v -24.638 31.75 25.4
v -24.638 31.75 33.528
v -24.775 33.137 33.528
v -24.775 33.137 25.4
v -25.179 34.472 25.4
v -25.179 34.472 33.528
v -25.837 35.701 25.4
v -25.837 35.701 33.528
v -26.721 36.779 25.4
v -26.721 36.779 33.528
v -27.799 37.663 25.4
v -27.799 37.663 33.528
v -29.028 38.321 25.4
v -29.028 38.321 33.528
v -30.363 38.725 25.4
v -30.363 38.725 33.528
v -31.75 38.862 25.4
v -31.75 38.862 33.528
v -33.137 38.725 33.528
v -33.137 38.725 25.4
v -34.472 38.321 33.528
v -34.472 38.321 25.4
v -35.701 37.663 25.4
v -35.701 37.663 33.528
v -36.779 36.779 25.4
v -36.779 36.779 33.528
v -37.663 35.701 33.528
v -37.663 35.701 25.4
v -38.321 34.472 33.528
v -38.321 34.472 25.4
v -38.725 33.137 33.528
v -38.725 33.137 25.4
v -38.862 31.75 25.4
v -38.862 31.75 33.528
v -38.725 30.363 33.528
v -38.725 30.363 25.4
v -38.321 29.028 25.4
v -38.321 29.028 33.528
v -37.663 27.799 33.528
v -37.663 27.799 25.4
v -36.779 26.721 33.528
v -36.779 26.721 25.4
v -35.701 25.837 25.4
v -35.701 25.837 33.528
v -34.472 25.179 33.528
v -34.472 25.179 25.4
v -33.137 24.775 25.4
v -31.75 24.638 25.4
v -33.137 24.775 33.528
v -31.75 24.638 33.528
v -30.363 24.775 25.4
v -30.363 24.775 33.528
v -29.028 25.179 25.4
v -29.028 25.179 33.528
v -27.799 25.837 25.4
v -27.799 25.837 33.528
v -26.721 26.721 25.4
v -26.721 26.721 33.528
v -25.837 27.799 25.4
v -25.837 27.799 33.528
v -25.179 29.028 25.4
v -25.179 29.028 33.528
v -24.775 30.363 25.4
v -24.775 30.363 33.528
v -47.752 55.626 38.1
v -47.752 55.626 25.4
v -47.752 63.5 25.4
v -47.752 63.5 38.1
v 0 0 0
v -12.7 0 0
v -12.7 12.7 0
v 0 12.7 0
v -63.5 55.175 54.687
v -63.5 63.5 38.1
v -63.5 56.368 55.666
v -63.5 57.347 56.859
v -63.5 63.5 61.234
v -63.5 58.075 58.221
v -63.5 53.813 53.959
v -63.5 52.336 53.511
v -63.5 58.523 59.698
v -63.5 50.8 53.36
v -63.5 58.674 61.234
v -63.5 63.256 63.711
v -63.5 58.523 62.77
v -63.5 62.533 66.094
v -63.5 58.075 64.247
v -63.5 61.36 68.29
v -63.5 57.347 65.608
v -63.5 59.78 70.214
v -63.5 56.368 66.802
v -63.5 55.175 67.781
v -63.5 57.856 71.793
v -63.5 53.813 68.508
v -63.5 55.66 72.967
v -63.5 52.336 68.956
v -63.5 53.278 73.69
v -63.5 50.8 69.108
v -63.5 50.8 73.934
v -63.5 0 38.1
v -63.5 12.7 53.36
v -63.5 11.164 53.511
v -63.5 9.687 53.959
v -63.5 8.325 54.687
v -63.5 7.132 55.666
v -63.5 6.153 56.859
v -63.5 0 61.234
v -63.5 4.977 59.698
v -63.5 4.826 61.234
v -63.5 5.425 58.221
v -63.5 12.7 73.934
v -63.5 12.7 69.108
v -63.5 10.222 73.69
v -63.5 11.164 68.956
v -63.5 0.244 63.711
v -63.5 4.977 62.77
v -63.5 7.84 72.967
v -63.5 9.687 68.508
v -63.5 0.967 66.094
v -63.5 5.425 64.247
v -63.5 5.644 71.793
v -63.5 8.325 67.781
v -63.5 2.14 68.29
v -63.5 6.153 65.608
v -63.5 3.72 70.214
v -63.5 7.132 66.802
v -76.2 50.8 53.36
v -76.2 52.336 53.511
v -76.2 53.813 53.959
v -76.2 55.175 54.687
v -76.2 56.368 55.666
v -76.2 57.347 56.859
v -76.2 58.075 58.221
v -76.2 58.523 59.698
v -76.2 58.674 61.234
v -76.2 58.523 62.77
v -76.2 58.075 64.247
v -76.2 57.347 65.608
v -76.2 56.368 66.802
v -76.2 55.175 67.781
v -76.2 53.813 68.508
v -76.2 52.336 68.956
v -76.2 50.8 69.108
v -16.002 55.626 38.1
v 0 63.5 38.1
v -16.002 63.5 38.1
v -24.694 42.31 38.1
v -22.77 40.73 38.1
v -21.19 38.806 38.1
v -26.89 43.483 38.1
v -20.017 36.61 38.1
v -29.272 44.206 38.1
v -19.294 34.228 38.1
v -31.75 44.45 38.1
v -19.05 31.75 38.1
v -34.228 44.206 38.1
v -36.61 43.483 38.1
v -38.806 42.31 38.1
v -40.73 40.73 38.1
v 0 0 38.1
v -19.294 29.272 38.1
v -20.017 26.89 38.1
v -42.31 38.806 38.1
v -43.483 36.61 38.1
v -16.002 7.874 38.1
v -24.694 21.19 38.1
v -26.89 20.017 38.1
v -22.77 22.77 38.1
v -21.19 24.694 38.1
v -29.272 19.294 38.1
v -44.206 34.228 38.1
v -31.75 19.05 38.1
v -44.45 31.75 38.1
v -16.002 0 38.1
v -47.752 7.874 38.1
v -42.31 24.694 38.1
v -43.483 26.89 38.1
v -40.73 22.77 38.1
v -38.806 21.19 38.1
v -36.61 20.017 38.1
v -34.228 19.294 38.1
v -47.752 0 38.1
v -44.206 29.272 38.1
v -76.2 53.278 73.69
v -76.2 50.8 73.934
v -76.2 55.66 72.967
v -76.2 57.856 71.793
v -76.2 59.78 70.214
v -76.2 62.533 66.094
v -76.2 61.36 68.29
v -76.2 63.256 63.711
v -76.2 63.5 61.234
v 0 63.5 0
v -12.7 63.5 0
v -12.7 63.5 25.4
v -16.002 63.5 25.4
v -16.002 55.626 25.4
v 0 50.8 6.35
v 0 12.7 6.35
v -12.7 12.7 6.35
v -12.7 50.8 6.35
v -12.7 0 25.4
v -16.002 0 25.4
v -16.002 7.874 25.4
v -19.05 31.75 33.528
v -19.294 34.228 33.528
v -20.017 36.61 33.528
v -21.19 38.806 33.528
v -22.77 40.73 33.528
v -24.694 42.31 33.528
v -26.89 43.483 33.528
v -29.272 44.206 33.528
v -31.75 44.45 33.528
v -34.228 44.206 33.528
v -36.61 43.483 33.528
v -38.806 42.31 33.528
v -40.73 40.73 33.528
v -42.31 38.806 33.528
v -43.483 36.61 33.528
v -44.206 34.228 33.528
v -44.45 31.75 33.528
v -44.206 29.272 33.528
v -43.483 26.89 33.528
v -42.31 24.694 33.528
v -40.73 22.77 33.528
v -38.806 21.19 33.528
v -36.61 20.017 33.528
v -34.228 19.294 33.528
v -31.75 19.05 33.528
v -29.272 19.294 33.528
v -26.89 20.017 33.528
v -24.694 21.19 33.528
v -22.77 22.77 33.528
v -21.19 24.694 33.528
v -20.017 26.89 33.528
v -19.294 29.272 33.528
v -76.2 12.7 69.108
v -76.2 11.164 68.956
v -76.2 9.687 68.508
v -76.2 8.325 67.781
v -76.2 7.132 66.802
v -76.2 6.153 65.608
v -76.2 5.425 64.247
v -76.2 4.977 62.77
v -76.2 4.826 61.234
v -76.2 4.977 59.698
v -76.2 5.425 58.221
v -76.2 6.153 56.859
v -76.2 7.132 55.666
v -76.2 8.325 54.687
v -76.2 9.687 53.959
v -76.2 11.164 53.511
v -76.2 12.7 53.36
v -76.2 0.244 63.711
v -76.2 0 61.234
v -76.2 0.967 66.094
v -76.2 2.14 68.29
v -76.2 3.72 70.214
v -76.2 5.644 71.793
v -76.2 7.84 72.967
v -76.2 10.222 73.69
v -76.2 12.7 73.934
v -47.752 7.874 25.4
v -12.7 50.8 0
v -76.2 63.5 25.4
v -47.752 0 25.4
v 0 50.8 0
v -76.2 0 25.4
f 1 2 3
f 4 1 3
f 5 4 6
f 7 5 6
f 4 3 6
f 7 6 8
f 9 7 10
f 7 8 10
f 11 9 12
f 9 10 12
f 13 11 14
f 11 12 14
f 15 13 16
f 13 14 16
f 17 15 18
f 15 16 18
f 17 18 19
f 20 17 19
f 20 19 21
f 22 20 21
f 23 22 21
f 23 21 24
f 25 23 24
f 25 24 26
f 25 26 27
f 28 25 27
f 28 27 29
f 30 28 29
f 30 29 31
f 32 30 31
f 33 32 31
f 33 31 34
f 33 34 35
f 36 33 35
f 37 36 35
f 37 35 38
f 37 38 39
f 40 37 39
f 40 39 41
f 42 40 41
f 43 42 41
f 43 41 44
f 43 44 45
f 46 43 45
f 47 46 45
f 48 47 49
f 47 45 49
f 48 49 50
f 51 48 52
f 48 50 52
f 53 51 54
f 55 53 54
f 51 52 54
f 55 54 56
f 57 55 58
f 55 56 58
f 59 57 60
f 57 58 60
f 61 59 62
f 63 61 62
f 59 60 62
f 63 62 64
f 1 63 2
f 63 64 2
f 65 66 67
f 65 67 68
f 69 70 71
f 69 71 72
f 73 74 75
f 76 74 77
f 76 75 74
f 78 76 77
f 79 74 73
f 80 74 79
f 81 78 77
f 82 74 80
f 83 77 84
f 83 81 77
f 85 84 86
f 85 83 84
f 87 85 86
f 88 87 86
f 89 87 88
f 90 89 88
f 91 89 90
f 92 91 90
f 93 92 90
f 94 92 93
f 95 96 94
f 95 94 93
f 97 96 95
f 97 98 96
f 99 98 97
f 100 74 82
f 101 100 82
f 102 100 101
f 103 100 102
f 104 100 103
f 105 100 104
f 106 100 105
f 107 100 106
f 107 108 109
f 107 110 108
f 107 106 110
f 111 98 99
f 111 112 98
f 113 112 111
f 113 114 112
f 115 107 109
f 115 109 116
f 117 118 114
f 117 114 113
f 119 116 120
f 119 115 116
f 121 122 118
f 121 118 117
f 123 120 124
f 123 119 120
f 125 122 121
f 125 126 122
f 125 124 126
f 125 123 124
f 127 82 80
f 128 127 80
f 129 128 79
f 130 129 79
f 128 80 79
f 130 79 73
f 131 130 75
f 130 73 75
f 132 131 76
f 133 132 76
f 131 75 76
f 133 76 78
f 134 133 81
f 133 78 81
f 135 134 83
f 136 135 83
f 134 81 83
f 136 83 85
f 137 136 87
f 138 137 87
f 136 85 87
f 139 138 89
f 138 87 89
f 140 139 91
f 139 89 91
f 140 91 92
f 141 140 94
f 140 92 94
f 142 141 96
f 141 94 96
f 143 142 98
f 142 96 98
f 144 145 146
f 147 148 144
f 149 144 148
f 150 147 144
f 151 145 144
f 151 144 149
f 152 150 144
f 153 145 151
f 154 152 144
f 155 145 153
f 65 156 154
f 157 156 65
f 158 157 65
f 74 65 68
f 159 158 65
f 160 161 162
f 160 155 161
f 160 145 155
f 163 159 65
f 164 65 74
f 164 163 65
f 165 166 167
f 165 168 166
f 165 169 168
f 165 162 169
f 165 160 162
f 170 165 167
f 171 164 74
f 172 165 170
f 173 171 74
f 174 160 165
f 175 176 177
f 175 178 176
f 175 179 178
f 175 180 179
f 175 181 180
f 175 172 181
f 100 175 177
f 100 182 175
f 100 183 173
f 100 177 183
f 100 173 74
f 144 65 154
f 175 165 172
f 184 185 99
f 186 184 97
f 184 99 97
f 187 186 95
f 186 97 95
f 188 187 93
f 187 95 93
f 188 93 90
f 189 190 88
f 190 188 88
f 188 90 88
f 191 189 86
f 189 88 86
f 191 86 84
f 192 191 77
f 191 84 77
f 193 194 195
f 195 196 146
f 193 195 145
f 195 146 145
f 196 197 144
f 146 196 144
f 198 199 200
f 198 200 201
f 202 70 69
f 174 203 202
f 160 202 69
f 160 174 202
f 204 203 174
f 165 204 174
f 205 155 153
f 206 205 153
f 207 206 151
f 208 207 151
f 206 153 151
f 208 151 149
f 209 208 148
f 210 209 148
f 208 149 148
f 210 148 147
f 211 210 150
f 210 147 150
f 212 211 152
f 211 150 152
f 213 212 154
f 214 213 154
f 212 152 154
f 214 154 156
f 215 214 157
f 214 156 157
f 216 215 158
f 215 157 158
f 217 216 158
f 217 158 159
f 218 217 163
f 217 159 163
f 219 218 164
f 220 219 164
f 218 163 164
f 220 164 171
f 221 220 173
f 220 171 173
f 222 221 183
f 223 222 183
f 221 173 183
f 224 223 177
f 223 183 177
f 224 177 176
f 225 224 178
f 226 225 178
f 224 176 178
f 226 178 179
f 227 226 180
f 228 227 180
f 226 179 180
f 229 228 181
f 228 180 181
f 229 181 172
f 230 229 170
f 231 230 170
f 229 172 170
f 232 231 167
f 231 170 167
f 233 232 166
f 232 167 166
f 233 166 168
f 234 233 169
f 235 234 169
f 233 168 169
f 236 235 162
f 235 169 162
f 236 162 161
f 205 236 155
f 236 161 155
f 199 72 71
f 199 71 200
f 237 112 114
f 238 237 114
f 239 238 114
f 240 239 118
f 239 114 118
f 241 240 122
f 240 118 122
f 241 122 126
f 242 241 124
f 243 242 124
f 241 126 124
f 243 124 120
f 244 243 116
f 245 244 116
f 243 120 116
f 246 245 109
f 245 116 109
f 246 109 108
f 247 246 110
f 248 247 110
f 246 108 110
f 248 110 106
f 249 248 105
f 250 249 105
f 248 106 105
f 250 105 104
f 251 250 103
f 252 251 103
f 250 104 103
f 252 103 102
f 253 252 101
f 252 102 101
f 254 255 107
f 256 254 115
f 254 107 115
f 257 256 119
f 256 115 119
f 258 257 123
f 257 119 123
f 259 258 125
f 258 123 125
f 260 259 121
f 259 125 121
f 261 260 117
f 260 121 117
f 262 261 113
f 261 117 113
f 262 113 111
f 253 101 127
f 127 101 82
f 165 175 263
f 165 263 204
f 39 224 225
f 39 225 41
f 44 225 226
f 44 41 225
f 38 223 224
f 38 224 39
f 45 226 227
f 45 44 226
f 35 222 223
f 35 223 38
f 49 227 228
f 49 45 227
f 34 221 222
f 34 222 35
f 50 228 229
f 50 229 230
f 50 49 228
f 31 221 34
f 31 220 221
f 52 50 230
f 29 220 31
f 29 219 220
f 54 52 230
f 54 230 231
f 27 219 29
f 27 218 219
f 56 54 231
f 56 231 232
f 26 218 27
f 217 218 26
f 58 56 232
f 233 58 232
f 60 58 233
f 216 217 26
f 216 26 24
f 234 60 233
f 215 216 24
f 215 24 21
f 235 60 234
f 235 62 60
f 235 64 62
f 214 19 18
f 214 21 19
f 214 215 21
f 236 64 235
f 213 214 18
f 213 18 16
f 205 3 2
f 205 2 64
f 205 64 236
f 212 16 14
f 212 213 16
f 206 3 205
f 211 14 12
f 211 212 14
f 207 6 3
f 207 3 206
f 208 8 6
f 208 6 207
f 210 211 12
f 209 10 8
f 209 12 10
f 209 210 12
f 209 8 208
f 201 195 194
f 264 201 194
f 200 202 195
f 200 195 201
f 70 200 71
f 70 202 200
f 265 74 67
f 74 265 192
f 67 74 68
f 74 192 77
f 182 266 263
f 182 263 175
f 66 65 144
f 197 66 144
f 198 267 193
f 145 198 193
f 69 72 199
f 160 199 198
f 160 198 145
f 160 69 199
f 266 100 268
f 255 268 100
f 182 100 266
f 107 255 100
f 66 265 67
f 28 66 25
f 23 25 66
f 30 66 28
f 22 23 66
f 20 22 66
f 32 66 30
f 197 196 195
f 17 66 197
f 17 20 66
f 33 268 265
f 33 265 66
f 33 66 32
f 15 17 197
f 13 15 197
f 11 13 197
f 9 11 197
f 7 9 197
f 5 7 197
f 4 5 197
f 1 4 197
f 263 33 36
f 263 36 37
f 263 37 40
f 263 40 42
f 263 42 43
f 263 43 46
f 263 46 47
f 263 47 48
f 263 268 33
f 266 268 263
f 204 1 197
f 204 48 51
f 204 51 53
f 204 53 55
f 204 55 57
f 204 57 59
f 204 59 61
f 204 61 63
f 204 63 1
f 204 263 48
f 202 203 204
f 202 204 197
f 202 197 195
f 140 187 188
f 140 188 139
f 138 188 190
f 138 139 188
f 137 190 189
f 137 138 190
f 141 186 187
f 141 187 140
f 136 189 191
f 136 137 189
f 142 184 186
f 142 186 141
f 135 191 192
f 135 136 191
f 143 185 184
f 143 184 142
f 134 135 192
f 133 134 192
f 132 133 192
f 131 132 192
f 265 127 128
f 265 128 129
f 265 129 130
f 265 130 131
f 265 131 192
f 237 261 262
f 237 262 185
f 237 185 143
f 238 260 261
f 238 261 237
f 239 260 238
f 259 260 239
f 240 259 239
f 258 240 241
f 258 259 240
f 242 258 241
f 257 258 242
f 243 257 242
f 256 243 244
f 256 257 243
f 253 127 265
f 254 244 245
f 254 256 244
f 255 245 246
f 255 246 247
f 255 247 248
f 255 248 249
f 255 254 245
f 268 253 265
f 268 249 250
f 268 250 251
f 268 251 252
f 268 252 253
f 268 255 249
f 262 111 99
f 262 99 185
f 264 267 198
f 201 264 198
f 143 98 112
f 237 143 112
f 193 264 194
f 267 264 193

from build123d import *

# Parameters (mm, degrees)
F0_W      = 31.75
F0_H      = 12.7
F0_W_2    = 15.748
F1_DEPTH  = 63.5
F2_DEPTH  = 7.874
F3_START  = -55.626
F3_DEPTH  = 7.874
F4_W      = 38.1
F4_H      = 6.35
F5_DEPTH  = 25.4
F6_R      = 12.7
F6_R_2    = 7.112
F7_DEPTH  = 4.572
F8_DEPTH  = 25.4
F10_DEPTH = 25.4
F11_DEPTH = 25.4


with BuildPart() as f1:
    # F0 (on Front) → F1 (new body)
    with BuildSketch(Plane.XZ):
        Polygon((-12.7, 0), (0, 0), (0, 38.1), (-16.002, 38.1), (-16.002, 25.4), (-12.7, 25.4), align=None)
        with Locations((-31.877, 31.75)):
            Rectangle(F0_W, F0_H)
        with Locations((-55.626, 31.75)):
            Rectangle(F0_W_2, F0_H)
        Polygon((-63.5, 25.4), (-63.5, 38.1), (-63.5, 73.9337697108), (-76.2, 73.9337697108), (-76.2, 25.4), align=None)
    extrude(amount=-F1_DEPTH)

    # F0 (on Front) → F2 (cut)
    with BuildSketch(Plane.XZ):
        with Locations((-31.877, 31.75)):
            Rectangle(F0_W, F0_H)
    extrude(amount=-F2_DEPTH, mode=Mode.SUBTRACT)

    # F0 (on Front) → F3 (cut)
    with BuildSketch(Plane.XZ.offset(F3_START)):
        with Locations((-31.877, 31.75)):
            Rectangle(F0_W, F0_H)
    extrude(amount=-F3_DEPTH, mode=Mode.SUBTRACT)

    # F4 (on face) → F5 (cut)
    with BuildSketch(Plane.YZ):
        with Locations((31.75, 3.175)):
            Rectangle(F4_W, F4_H)
    extrude(amount=-F5_DEPTH, mode=Mode.SUBTRACT)

    # F6 (on face) → F7 (cut)
    with BuildSketch(Plane.XY.offset(38.1)):
        with Locations((-31.75, 31.75)):
            Circle(F6_R)
        with Locations((-31.75, 31.75)):
            Circle(F6_R_2, mode=Mode.SUBTRACT)
    extrude(amount=-F7_DEPTH, mode=Mode.SUBTRACT)

    # F8 (cut): a face of the model
    f8_faces = [f1.faces().sort_by_distance(p)[0] for p in [
        (-31.75, 31.75, 38.1),
    ]]
    extrude(f8_faces, amount=-F8_DEPTH, mode=Mode.SUBTRACT)

    # F9 (on face) → F10 (cut)
    with BuildSketch(Plane.YZ.offset(-63.5)):
        with BuildLine():
            Line((63.5, 73.9337697108), (50.8, 73.9337697108))
            ThreePointArc((50.8, 73.9337697108), (59.7802561211, 70.2140258318), (63.5, 61.2337697108))
            Line((63.5, 61.2337697108), (63.5, 73.9337697108))
        make_face()
        with BuildLine():
            ThreePointArc((0, 61.2337697108), (3.7197438789, 70.2140258318), (12.7, 73.9337697108))
            Line((12.7, 73.9337697108), (0, 73.9337697108))
            Line((0, 73.9337697108), (0, 61.2337697108))
        make_face()
    extrude(amount=-F10_DEPTH, mode=Mode.SUBTRACT)

    # F9 (on face) → F11 (cut)
    with BuildSketch(Plane.YZ.offset(-63.5)):
        with BuildLine():
            Line((50.8, 69.1077697108), (12.7, 69.1077697108))
            ThreePointArc((12.7, 69.1077697108), (4.826, 61.2337697108), (12.7, 53.3597697108))
            Line((12.7, 53.3597697108), (50.8, 53.3597697108))
            ThreePointArc((50.8, 53.3597697108), (58.674, 61.2337697108), (50.8, 69.1077697108))
        make_face()
    extrude(amount=-F11_DEPTH, mode=Mode.SUBTRACT)


solid = f1.part
